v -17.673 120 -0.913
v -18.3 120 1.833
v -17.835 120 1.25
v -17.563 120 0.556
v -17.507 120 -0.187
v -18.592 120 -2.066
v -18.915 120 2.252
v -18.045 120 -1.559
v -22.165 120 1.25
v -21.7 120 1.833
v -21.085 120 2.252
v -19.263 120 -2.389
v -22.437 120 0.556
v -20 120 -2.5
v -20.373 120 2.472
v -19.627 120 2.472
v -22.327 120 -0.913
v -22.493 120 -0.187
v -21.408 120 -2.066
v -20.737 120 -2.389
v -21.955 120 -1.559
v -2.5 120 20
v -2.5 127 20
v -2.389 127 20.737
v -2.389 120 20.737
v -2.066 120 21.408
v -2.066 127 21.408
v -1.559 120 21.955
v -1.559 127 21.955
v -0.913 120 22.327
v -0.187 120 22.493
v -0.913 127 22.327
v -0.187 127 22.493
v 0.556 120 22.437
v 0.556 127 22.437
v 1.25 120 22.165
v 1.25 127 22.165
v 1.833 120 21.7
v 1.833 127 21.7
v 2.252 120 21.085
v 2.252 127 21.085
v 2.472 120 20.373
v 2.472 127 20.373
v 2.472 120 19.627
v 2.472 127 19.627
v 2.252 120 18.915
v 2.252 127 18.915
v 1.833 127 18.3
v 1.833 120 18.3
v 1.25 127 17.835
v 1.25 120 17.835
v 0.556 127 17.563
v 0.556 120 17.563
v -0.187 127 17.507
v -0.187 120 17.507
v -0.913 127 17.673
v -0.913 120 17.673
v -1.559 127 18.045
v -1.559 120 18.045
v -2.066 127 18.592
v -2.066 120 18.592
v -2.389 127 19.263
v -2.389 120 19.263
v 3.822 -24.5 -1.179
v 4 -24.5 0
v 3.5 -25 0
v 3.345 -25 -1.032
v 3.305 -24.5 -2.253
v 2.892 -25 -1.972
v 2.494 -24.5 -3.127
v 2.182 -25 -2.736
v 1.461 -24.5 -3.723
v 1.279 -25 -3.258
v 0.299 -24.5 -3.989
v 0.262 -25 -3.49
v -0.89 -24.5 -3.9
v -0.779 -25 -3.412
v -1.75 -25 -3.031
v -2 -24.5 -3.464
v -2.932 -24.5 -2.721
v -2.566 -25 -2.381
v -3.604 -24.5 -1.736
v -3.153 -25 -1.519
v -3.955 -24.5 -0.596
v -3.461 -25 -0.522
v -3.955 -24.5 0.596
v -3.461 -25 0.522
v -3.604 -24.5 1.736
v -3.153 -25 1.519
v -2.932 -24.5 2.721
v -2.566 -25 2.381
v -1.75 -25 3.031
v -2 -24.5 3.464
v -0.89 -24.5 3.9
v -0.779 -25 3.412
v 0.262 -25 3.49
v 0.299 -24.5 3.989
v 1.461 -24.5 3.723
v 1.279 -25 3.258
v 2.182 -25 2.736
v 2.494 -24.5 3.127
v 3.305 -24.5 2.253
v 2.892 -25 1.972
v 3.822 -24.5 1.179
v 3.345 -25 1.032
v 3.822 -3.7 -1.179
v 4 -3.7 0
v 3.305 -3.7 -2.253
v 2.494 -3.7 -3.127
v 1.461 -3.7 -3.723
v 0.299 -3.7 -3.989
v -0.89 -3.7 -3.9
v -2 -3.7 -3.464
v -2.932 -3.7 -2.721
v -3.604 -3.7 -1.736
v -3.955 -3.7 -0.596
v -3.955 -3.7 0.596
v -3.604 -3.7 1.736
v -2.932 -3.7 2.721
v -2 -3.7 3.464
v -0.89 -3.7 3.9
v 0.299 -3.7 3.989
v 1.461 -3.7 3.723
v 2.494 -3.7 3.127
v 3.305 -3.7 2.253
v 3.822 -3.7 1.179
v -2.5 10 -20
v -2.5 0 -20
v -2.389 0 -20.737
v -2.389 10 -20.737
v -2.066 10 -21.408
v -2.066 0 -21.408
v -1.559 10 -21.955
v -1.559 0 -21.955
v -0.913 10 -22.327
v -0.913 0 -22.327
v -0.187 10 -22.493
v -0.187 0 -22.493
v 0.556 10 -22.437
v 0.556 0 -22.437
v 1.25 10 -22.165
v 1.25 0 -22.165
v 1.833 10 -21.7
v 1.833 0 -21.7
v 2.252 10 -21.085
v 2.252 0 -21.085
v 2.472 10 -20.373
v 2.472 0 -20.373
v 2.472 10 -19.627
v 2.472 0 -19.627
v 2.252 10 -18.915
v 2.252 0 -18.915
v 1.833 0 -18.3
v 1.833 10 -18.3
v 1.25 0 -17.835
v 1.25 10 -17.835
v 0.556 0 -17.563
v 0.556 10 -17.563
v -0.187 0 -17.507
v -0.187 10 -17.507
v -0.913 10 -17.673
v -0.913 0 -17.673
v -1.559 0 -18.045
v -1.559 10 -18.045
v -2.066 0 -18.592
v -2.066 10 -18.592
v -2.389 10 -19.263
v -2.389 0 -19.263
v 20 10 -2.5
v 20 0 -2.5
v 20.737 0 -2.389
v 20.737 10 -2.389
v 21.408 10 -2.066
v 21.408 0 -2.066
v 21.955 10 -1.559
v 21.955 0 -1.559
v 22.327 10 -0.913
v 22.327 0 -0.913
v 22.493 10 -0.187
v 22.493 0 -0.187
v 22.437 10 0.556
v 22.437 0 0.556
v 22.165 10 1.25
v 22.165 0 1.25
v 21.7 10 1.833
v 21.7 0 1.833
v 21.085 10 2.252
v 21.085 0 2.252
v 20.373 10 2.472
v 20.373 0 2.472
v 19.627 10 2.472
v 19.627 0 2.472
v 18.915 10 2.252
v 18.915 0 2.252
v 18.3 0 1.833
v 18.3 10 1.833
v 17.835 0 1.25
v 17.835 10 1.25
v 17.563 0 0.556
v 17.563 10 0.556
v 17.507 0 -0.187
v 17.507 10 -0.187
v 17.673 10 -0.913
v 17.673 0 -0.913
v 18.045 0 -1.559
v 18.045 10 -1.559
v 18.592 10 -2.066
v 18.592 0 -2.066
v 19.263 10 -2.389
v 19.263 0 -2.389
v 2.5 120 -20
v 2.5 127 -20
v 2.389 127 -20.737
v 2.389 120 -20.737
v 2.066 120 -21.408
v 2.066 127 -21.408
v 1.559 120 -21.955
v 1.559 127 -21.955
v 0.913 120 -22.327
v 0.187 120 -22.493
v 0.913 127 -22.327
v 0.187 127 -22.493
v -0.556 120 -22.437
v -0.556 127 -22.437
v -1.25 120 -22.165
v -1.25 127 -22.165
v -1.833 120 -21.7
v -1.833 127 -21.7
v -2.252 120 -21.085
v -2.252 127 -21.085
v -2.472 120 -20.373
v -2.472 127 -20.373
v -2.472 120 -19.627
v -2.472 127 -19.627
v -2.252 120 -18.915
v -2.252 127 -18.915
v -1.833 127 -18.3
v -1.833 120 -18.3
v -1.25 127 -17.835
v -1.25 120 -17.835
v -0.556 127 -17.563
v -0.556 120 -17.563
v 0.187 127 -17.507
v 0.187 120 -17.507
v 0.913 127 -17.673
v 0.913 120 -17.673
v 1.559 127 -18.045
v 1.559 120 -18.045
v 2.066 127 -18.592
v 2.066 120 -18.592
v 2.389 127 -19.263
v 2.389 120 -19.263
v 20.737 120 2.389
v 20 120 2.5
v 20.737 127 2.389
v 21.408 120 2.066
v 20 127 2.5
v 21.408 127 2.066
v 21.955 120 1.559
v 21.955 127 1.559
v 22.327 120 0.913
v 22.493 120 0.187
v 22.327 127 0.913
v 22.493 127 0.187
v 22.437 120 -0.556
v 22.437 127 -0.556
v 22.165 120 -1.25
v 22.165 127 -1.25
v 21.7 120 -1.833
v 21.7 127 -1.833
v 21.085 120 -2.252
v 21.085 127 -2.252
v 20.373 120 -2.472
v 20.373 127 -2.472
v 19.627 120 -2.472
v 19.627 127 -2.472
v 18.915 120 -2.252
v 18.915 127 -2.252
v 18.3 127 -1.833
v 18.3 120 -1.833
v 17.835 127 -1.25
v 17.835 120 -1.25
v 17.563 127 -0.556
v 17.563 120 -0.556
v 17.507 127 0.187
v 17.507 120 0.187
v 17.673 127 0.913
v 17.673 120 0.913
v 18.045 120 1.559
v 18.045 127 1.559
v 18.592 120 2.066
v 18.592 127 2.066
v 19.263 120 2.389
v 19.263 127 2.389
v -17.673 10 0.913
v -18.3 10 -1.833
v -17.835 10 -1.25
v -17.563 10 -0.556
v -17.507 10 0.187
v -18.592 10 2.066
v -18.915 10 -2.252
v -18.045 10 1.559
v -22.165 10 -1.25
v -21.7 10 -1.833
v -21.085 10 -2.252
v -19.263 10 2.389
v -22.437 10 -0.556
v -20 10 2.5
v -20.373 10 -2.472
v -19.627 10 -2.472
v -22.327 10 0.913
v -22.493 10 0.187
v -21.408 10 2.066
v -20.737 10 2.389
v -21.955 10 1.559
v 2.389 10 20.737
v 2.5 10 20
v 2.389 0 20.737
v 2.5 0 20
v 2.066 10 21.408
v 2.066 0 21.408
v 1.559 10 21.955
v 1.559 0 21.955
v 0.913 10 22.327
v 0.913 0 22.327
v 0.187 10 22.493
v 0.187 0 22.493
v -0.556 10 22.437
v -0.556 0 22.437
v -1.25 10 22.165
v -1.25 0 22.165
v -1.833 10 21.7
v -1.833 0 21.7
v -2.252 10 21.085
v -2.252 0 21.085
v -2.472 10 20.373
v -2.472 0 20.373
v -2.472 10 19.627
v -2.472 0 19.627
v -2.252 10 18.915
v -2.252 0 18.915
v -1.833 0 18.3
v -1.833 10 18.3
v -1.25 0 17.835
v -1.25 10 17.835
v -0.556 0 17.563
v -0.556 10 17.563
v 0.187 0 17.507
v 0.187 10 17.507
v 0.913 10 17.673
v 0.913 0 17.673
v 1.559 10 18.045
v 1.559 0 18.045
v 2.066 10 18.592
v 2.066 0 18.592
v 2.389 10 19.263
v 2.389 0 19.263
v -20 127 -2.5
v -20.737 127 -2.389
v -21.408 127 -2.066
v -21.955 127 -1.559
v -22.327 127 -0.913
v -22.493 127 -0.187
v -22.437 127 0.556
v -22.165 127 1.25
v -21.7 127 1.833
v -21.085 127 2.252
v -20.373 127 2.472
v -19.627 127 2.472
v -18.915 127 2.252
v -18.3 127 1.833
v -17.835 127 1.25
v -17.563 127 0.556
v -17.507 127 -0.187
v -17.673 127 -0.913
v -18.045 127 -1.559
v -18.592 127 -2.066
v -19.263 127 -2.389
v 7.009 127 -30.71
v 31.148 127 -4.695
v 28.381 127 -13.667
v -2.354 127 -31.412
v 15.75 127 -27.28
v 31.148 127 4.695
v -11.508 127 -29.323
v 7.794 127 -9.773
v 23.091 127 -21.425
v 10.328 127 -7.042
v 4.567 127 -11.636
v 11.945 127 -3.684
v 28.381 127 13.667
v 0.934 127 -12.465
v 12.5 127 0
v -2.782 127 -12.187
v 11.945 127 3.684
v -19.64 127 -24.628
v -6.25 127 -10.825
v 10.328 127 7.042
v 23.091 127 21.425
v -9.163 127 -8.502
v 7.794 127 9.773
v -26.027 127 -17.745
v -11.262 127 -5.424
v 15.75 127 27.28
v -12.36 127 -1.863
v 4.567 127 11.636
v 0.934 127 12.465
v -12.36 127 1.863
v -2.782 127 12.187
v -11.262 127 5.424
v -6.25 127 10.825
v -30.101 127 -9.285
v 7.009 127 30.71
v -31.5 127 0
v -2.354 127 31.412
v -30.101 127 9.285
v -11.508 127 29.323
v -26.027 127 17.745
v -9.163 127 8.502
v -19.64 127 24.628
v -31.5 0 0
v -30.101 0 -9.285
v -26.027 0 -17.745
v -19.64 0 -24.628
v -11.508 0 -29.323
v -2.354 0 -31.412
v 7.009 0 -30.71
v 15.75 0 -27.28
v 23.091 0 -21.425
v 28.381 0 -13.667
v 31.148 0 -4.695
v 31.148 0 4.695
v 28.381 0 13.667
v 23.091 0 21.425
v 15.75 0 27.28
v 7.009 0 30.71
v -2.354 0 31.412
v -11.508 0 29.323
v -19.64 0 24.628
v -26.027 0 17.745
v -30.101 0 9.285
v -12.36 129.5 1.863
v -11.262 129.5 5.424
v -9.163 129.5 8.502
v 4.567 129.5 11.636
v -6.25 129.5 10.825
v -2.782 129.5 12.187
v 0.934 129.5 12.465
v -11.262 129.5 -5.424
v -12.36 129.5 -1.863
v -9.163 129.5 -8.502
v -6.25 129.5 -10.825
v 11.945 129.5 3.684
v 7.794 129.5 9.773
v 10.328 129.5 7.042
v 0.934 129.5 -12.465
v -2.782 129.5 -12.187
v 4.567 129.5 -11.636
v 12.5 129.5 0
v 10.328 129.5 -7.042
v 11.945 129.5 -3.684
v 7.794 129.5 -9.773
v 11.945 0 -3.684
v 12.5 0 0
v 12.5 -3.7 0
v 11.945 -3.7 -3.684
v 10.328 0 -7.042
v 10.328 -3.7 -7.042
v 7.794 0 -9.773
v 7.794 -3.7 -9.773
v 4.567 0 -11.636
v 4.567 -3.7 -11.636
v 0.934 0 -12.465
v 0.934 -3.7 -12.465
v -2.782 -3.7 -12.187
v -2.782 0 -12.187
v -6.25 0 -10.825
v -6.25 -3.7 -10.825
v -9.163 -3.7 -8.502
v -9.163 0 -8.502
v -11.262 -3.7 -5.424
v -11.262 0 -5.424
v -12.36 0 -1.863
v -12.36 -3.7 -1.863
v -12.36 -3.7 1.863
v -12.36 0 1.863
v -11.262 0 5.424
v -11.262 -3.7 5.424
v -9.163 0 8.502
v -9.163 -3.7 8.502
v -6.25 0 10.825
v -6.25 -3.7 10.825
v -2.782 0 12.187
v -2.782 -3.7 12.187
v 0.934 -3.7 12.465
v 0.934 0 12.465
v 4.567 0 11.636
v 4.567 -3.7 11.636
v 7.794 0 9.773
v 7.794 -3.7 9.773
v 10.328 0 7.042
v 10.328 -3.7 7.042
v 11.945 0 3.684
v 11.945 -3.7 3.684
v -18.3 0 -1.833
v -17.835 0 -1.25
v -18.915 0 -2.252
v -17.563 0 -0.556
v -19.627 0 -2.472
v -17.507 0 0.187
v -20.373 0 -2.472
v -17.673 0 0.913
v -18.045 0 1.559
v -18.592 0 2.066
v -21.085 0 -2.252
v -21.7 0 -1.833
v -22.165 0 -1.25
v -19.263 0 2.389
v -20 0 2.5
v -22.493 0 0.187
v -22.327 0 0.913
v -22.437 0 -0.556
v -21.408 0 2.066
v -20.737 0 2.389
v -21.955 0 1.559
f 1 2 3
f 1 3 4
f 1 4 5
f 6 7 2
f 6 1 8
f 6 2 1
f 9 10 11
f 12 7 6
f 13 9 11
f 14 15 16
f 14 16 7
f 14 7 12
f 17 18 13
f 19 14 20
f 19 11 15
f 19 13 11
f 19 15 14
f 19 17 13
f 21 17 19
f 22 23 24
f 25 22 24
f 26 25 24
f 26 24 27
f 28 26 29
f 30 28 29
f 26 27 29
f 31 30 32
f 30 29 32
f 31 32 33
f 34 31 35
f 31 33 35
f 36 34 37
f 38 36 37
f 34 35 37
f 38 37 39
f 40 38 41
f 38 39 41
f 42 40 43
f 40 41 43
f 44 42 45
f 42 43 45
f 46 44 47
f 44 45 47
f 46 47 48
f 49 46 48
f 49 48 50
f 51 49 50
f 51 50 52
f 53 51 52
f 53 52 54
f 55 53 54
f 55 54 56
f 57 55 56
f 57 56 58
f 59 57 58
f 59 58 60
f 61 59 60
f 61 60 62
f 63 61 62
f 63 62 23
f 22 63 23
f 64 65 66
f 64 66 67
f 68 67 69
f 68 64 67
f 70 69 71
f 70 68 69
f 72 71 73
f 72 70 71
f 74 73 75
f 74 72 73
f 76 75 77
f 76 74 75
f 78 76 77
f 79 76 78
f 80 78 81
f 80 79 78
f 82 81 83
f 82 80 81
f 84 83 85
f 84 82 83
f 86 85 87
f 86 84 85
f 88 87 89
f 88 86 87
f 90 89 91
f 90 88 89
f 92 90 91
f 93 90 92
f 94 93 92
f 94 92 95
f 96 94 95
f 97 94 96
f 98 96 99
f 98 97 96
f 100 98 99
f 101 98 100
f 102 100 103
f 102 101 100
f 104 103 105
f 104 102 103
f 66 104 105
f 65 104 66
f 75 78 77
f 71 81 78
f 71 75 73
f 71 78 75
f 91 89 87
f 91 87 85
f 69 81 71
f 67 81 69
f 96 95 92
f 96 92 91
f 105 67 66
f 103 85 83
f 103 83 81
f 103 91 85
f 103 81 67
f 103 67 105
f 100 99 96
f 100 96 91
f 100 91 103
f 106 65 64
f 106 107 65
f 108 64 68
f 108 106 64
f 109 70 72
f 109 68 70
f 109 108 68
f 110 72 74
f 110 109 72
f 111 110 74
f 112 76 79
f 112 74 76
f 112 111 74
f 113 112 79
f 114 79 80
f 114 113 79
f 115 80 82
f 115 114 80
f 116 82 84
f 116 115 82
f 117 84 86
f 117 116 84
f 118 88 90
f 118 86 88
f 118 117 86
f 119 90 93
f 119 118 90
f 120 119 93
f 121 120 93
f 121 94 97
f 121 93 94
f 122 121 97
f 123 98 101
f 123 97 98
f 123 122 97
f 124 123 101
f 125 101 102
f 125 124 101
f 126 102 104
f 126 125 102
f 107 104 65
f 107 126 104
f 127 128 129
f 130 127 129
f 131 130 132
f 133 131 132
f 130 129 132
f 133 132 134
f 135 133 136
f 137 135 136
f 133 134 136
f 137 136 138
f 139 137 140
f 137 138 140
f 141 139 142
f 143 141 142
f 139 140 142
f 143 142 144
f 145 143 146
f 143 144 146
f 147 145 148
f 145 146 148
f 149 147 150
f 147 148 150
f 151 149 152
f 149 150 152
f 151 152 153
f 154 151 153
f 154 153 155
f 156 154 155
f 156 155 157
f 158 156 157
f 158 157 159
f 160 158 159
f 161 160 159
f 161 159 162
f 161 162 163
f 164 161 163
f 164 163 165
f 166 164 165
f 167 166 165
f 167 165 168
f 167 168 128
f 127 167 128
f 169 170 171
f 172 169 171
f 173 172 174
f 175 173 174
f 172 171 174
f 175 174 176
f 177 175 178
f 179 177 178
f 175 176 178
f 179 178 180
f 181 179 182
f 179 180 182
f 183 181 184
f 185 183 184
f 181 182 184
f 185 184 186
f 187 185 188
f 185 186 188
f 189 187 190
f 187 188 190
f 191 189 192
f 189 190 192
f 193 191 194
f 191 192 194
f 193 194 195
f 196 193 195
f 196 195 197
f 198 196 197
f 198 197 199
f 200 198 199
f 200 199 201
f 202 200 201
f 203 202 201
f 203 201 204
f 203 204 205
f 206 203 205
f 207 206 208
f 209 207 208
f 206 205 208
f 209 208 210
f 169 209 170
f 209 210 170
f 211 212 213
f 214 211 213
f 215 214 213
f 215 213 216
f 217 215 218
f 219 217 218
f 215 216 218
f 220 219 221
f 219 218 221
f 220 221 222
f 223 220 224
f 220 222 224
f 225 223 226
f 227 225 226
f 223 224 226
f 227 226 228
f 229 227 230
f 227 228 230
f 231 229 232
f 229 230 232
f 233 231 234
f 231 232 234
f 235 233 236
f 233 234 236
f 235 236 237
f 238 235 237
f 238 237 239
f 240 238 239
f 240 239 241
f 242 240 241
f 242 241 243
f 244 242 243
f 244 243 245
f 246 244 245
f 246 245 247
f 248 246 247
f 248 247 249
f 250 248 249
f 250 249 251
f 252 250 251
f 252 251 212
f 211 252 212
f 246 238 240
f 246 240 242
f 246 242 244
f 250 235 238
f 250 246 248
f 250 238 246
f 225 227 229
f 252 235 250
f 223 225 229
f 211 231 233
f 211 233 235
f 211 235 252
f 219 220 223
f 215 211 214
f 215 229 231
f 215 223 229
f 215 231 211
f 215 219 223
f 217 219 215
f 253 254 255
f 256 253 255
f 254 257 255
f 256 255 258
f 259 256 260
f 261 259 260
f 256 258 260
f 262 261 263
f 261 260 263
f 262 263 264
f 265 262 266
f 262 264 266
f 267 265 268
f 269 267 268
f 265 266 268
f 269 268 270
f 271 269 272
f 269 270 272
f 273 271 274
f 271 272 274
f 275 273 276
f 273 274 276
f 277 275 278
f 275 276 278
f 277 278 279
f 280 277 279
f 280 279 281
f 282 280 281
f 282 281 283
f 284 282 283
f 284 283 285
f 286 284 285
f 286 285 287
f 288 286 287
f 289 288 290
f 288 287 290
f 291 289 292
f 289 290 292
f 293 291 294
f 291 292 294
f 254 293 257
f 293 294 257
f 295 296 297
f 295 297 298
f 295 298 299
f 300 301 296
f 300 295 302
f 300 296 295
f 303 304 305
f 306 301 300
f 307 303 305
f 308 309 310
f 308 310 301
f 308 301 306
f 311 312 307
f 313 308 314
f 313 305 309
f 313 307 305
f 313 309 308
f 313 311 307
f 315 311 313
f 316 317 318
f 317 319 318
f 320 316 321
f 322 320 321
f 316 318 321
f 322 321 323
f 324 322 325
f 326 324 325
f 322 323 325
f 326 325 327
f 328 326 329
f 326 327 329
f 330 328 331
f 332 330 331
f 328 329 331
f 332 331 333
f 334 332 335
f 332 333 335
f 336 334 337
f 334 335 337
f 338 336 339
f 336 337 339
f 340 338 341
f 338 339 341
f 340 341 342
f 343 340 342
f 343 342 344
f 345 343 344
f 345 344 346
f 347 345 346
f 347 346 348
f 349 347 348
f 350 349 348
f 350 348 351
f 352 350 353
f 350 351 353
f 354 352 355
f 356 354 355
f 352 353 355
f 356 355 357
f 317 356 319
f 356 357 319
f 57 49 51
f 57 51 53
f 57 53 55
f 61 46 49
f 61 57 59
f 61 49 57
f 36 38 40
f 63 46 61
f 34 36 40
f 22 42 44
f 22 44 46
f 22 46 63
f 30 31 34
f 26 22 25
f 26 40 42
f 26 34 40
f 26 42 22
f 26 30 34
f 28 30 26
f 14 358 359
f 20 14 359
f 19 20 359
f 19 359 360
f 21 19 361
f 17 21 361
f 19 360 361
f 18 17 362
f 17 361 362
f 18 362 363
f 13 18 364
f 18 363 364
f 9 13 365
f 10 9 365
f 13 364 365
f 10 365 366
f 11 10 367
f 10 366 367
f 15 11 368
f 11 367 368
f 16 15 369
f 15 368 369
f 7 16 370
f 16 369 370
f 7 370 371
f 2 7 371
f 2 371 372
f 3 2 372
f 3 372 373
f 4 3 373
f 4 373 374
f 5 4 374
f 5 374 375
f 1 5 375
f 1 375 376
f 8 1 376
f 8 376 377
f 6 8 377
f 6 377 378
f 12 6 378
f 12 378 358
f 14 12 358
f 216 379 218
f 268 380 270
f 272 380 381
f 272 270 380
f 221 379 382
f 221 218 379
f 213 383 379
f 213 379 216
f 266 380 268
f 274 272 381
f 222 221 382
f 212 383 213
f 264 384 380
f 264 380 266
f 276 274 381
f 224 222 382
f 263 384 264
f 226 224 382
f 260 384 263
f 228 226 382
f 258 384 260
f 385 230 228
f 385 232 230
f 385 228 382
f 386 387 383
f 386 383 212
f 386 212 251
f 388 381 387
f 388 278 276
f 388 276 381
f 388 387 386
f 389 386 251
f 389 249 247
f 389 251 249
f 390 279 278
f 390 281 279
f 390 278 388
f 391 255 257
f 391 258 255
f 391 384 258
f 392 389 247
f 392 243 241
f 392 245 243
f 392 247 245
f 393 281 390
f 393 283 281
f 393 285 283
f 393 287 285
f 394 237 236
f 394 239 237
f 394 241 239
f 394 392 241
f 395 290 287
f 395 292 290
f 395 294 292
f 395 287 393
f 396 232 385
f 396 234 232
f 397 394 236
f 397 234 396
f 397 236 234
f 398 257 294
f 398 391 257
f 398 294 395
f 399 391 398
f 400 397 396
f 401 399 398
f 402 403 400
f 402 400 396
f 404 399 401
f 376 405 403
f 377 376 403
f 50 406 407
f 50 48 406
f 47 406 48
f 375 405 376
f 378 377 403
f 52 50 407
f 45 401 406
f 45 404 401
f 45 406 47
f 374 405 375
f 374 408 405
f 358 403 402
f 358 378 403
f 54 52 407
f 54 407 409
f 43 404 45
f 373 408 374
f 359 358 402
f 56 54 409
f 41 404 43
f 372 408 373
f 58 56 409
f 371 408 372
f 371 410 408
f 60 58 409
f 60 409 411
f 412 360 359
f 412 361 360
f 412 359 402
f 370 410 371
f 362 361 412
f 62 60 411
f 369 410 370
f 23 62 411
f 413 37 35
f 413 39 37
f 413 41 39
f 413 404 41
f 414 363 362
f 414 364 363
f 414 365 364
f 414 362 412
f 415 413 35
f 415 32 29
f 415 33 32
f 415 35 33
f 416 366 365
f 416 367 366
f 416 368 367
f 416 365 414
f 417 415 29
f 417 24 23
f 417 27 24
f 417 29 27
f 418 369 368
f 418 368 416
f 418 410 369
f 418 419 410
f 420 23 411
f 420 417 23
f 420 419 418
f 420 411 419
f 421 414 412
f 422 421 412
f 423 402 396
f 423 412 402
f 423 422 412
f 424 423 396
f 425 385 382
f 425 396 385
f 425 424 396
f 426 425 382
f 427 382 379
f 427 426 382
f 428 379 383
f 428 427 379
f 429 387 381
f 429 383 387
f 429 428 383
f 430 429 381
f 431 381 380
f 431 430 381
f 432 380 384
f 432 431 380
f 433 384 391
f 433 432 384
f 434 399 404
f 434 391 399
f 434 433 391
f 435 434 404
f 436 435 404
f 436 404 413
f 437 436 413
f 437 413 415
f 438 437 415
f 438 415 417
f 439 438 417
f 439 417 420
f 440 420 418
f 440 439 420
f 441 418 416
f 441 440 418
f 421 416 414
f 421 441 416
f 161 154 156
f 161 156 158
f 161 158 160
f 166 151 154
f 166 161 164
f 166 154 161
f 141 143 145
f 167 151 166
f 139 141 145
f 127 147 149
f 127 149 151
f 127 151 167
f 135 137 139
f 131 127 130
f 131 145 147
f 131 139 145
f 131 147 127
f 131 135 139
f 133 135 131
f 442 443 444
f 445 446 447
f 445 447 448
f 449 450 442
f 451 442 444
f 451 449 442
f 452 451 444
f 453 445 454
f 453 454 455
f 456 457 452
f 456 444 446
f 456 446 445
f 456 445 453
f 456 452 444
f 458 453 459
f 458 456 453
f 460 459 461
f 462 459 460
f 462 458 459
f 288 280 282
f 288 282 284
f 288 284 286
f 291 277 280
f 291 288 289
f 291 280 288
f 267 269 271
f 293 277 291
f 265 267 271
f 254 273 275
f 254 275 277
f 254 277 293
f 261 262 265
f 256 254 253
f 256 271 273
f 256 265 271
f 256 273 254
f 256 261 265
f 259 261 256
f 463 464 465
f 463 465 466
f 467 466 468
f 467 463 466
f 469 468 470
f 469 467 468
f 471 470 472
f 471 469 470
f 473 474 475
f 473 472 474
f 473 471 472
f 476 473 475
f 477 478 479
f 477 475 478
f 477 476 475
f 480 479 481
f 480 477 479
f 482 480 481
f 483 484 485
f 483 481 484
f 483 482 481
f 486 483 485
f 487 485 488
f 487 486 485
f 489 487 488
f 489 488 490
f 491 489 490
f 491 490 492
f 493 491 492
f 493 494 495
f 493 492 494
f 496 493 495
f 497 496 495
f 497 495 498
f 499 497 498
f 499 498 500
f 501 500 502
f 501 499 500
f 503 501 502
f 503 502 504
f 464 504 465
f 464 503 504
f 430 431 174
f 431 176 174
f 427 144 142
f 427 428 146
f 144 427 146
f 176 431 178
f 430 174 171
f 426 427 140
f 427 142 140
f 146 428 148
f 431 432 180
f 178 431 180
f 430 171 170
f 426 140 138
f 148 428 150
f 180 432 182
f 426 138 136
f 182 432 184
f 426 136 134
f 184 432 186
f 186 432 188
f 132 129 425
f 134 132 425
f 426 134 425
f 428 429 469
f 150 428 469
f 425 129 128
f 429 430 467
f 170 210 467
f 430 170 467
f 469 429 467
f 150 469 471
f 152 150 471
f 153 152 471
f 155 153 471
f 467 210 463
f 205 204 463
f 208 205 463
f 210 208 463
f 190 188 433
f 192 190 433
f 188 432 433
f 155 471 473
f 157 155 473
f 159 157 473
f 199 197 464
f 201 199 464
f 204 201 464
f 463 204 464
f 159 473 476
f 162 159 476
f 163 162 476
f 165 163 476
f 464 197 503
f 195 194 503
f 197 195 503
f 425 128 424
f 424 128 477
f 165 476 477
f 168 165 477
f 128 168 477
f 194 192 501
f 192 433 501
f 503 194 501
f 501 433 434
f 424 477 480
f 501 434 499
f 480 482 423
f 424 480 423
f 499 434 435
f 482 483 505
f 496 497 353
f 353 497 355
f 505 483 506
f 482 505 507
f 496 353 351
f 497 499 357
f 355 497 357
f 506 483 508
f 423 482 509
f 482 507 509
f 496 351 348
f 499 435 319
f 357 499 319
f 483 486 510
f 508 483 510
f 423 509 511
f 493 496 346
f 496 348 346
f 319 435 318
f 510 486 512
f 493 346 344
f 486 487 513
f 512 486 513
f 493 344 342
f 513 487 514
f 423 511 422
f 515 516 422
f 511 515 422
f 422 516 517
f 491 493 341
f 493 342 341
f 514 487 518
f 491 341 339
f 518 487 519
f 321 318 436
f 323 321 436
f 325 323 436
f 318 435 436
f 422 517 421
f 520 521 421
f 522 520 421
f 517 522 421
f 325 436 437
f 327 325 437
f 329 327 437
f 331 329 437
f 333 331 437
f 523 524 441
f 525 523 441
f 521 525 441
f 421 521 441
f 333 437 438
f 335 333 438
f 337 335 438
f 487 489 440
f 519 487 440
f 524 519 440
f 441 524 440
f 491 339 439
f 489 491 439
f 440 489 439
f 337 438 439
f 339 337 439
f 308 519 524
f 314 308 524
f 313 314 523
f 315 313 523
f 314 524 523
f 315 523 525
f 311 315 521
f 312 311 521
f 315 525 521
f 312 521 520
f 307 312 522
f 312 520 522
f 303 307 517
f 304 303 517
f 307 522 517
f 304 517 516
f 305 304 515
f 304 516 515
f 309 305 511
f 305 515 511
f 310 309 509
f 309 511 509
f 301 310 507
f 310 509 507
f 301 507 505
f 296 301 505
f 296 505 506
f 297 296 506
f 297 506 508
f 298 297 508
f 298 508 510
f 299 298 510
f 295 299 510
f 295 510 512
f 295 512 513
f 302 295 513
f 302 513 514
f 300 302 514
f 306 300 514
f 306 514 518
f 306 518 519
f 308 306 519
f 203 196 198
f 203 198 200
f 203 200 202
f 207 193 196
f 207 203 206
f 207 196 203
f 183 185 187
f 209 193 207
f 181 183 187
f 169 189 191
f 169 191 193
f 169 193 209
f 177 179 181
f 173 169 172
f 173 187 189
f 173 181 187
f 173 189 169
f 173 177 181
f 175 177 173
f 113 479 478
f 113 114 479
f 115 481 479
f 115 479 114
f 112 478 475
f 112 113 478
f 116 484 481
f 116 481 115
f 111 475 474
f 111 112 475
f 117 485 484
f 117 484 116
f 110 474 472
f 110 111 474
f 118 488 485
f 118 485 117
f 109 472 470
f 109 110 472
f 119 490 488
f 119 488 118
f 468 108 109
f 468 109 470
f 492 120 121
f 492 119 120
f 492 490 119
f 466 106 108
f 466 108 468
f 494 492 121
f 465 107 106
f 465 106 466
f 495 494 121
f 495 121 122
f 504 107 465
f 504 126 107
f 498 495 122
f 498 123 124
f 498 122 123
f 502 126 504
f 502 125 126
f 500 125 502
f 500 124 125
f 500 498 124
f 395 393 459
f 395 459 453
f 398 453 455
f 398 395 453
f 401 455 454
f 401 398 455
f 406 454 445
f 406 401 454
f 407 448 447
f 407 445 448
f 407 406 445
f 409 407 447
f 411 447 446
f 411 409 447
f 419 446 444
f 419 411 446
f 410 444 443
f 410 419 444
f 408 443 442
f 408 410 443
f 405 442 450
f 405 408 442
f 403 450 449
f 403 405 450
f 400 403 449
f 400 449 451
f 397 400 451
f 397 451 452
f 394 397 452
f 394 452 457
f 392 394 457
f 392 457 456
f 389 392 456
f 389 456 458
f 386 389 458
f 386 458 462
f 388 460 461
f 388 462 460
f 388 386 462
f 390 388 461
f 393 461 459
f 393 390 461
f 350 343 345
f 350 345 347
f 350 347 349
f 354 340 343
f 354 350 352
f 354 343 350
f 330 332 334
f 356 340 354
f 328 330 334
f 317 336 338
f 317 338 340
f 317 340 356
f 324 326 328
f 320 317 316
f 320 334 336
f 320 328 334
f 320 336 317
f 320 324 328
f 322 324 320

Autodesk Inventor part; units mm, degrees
ref_plane "YZ Plane" through (0, 0, 0) normal (1, 0, 0) x (0, 1, 0)
ref_plane "XZ Plane" through (0, 0, 0) normal (0, 1, 0) x (-1, 0, 0)
ref_plane "XY Plane" through (0, 0, 0) normal (0, 0, 1) x (1, 0, 0)
sketch "Esquisse1" plane through (0, 0, 0) normal (0, 1, 0) x (-1, 0, 0)
  circle A0 centre (0, 0) radius 31.5
  dimension "d0" = 63
extrude "Extrusion1" add sketch "Esquisse1" along normal blind 127
sketch "Esquisse2" plane through (0, 127, 0) normal (0, 1, 0) x (1, 0, 0)
  circle A0 centre (0, 0) radius 31.5 projected
  circle A1 centre (0, 0) radius 12.5
  dimension "d3" = 25
extrude "Extrusion2" add sketch "Esquisse2" along normal blind 2.5 contours A1
sketch "Esquisse3" plane through (0, 0, 0) normal (0, -1, 0) x (1, 0, 0)
  circle A0 centre (0, 0) radius 31.5 projected
  circle A1 centre (0, 0) radius 12.5
  dimension "d6" = 25
extrude "Extrusion3" add sketch "Esquisse3" along normal blind 3.7 contours A1
sketch "Esquisse4" plane through (0, -3.7, 0) normal (0, -1, 0) x (1, 0, 0)
  circle A0 centre (0, 0) radius 12.5 projected
  circle A1 centre (0, 0) radius 4
  dimension "d9" = 8
extrude "Extrusion4" add sketch "Esquisse4" along normal blind 21.3 contours A1
chamfer "Chanfrein1" distance 0.5 angle 45 1 edges at (-4, -25, 0)
sketch "Esquisse5" plane through (0, 0, 0) normal (0, -1, 0) x (1, 0, 0)
  circle A0 centre (0, 0) radius 12.5 projected
  circle A1 centre (0, 20) radius 2.5
  dimension "d15" = 5
  dimension "d16" = 20
extrude "Extrusion5" cut sketch "Esquisse5" against normal blind 10 contours A1
pattern_circular "Réseau circulaire1" count 4 over 360 about axis through (0, -3.7, 0) along (0, -1, 0) of "Extrusion5"
sketch "Esquisse6" plane through (0, 127, 0) normal (0, 1, 0) x (1, 0, 0)
  circle A0 centre (0, 0) radius 12.5 projected
  circle A1 centre (0, 20) radius 2.5
  dimension "d22" = 5
  dimension "d23" = 20
extrude "Extrusion6" cut sketch "Esquisse6" against normal blind 7 contours A1
pattern_circular "Réseau circulaire2" count 4 over 360 about axis through (0, 127, 0) along (0, 1, 0) of "Extrusion6"
properties part number "Moteur Crouzet" material "Acier inoxydable"
